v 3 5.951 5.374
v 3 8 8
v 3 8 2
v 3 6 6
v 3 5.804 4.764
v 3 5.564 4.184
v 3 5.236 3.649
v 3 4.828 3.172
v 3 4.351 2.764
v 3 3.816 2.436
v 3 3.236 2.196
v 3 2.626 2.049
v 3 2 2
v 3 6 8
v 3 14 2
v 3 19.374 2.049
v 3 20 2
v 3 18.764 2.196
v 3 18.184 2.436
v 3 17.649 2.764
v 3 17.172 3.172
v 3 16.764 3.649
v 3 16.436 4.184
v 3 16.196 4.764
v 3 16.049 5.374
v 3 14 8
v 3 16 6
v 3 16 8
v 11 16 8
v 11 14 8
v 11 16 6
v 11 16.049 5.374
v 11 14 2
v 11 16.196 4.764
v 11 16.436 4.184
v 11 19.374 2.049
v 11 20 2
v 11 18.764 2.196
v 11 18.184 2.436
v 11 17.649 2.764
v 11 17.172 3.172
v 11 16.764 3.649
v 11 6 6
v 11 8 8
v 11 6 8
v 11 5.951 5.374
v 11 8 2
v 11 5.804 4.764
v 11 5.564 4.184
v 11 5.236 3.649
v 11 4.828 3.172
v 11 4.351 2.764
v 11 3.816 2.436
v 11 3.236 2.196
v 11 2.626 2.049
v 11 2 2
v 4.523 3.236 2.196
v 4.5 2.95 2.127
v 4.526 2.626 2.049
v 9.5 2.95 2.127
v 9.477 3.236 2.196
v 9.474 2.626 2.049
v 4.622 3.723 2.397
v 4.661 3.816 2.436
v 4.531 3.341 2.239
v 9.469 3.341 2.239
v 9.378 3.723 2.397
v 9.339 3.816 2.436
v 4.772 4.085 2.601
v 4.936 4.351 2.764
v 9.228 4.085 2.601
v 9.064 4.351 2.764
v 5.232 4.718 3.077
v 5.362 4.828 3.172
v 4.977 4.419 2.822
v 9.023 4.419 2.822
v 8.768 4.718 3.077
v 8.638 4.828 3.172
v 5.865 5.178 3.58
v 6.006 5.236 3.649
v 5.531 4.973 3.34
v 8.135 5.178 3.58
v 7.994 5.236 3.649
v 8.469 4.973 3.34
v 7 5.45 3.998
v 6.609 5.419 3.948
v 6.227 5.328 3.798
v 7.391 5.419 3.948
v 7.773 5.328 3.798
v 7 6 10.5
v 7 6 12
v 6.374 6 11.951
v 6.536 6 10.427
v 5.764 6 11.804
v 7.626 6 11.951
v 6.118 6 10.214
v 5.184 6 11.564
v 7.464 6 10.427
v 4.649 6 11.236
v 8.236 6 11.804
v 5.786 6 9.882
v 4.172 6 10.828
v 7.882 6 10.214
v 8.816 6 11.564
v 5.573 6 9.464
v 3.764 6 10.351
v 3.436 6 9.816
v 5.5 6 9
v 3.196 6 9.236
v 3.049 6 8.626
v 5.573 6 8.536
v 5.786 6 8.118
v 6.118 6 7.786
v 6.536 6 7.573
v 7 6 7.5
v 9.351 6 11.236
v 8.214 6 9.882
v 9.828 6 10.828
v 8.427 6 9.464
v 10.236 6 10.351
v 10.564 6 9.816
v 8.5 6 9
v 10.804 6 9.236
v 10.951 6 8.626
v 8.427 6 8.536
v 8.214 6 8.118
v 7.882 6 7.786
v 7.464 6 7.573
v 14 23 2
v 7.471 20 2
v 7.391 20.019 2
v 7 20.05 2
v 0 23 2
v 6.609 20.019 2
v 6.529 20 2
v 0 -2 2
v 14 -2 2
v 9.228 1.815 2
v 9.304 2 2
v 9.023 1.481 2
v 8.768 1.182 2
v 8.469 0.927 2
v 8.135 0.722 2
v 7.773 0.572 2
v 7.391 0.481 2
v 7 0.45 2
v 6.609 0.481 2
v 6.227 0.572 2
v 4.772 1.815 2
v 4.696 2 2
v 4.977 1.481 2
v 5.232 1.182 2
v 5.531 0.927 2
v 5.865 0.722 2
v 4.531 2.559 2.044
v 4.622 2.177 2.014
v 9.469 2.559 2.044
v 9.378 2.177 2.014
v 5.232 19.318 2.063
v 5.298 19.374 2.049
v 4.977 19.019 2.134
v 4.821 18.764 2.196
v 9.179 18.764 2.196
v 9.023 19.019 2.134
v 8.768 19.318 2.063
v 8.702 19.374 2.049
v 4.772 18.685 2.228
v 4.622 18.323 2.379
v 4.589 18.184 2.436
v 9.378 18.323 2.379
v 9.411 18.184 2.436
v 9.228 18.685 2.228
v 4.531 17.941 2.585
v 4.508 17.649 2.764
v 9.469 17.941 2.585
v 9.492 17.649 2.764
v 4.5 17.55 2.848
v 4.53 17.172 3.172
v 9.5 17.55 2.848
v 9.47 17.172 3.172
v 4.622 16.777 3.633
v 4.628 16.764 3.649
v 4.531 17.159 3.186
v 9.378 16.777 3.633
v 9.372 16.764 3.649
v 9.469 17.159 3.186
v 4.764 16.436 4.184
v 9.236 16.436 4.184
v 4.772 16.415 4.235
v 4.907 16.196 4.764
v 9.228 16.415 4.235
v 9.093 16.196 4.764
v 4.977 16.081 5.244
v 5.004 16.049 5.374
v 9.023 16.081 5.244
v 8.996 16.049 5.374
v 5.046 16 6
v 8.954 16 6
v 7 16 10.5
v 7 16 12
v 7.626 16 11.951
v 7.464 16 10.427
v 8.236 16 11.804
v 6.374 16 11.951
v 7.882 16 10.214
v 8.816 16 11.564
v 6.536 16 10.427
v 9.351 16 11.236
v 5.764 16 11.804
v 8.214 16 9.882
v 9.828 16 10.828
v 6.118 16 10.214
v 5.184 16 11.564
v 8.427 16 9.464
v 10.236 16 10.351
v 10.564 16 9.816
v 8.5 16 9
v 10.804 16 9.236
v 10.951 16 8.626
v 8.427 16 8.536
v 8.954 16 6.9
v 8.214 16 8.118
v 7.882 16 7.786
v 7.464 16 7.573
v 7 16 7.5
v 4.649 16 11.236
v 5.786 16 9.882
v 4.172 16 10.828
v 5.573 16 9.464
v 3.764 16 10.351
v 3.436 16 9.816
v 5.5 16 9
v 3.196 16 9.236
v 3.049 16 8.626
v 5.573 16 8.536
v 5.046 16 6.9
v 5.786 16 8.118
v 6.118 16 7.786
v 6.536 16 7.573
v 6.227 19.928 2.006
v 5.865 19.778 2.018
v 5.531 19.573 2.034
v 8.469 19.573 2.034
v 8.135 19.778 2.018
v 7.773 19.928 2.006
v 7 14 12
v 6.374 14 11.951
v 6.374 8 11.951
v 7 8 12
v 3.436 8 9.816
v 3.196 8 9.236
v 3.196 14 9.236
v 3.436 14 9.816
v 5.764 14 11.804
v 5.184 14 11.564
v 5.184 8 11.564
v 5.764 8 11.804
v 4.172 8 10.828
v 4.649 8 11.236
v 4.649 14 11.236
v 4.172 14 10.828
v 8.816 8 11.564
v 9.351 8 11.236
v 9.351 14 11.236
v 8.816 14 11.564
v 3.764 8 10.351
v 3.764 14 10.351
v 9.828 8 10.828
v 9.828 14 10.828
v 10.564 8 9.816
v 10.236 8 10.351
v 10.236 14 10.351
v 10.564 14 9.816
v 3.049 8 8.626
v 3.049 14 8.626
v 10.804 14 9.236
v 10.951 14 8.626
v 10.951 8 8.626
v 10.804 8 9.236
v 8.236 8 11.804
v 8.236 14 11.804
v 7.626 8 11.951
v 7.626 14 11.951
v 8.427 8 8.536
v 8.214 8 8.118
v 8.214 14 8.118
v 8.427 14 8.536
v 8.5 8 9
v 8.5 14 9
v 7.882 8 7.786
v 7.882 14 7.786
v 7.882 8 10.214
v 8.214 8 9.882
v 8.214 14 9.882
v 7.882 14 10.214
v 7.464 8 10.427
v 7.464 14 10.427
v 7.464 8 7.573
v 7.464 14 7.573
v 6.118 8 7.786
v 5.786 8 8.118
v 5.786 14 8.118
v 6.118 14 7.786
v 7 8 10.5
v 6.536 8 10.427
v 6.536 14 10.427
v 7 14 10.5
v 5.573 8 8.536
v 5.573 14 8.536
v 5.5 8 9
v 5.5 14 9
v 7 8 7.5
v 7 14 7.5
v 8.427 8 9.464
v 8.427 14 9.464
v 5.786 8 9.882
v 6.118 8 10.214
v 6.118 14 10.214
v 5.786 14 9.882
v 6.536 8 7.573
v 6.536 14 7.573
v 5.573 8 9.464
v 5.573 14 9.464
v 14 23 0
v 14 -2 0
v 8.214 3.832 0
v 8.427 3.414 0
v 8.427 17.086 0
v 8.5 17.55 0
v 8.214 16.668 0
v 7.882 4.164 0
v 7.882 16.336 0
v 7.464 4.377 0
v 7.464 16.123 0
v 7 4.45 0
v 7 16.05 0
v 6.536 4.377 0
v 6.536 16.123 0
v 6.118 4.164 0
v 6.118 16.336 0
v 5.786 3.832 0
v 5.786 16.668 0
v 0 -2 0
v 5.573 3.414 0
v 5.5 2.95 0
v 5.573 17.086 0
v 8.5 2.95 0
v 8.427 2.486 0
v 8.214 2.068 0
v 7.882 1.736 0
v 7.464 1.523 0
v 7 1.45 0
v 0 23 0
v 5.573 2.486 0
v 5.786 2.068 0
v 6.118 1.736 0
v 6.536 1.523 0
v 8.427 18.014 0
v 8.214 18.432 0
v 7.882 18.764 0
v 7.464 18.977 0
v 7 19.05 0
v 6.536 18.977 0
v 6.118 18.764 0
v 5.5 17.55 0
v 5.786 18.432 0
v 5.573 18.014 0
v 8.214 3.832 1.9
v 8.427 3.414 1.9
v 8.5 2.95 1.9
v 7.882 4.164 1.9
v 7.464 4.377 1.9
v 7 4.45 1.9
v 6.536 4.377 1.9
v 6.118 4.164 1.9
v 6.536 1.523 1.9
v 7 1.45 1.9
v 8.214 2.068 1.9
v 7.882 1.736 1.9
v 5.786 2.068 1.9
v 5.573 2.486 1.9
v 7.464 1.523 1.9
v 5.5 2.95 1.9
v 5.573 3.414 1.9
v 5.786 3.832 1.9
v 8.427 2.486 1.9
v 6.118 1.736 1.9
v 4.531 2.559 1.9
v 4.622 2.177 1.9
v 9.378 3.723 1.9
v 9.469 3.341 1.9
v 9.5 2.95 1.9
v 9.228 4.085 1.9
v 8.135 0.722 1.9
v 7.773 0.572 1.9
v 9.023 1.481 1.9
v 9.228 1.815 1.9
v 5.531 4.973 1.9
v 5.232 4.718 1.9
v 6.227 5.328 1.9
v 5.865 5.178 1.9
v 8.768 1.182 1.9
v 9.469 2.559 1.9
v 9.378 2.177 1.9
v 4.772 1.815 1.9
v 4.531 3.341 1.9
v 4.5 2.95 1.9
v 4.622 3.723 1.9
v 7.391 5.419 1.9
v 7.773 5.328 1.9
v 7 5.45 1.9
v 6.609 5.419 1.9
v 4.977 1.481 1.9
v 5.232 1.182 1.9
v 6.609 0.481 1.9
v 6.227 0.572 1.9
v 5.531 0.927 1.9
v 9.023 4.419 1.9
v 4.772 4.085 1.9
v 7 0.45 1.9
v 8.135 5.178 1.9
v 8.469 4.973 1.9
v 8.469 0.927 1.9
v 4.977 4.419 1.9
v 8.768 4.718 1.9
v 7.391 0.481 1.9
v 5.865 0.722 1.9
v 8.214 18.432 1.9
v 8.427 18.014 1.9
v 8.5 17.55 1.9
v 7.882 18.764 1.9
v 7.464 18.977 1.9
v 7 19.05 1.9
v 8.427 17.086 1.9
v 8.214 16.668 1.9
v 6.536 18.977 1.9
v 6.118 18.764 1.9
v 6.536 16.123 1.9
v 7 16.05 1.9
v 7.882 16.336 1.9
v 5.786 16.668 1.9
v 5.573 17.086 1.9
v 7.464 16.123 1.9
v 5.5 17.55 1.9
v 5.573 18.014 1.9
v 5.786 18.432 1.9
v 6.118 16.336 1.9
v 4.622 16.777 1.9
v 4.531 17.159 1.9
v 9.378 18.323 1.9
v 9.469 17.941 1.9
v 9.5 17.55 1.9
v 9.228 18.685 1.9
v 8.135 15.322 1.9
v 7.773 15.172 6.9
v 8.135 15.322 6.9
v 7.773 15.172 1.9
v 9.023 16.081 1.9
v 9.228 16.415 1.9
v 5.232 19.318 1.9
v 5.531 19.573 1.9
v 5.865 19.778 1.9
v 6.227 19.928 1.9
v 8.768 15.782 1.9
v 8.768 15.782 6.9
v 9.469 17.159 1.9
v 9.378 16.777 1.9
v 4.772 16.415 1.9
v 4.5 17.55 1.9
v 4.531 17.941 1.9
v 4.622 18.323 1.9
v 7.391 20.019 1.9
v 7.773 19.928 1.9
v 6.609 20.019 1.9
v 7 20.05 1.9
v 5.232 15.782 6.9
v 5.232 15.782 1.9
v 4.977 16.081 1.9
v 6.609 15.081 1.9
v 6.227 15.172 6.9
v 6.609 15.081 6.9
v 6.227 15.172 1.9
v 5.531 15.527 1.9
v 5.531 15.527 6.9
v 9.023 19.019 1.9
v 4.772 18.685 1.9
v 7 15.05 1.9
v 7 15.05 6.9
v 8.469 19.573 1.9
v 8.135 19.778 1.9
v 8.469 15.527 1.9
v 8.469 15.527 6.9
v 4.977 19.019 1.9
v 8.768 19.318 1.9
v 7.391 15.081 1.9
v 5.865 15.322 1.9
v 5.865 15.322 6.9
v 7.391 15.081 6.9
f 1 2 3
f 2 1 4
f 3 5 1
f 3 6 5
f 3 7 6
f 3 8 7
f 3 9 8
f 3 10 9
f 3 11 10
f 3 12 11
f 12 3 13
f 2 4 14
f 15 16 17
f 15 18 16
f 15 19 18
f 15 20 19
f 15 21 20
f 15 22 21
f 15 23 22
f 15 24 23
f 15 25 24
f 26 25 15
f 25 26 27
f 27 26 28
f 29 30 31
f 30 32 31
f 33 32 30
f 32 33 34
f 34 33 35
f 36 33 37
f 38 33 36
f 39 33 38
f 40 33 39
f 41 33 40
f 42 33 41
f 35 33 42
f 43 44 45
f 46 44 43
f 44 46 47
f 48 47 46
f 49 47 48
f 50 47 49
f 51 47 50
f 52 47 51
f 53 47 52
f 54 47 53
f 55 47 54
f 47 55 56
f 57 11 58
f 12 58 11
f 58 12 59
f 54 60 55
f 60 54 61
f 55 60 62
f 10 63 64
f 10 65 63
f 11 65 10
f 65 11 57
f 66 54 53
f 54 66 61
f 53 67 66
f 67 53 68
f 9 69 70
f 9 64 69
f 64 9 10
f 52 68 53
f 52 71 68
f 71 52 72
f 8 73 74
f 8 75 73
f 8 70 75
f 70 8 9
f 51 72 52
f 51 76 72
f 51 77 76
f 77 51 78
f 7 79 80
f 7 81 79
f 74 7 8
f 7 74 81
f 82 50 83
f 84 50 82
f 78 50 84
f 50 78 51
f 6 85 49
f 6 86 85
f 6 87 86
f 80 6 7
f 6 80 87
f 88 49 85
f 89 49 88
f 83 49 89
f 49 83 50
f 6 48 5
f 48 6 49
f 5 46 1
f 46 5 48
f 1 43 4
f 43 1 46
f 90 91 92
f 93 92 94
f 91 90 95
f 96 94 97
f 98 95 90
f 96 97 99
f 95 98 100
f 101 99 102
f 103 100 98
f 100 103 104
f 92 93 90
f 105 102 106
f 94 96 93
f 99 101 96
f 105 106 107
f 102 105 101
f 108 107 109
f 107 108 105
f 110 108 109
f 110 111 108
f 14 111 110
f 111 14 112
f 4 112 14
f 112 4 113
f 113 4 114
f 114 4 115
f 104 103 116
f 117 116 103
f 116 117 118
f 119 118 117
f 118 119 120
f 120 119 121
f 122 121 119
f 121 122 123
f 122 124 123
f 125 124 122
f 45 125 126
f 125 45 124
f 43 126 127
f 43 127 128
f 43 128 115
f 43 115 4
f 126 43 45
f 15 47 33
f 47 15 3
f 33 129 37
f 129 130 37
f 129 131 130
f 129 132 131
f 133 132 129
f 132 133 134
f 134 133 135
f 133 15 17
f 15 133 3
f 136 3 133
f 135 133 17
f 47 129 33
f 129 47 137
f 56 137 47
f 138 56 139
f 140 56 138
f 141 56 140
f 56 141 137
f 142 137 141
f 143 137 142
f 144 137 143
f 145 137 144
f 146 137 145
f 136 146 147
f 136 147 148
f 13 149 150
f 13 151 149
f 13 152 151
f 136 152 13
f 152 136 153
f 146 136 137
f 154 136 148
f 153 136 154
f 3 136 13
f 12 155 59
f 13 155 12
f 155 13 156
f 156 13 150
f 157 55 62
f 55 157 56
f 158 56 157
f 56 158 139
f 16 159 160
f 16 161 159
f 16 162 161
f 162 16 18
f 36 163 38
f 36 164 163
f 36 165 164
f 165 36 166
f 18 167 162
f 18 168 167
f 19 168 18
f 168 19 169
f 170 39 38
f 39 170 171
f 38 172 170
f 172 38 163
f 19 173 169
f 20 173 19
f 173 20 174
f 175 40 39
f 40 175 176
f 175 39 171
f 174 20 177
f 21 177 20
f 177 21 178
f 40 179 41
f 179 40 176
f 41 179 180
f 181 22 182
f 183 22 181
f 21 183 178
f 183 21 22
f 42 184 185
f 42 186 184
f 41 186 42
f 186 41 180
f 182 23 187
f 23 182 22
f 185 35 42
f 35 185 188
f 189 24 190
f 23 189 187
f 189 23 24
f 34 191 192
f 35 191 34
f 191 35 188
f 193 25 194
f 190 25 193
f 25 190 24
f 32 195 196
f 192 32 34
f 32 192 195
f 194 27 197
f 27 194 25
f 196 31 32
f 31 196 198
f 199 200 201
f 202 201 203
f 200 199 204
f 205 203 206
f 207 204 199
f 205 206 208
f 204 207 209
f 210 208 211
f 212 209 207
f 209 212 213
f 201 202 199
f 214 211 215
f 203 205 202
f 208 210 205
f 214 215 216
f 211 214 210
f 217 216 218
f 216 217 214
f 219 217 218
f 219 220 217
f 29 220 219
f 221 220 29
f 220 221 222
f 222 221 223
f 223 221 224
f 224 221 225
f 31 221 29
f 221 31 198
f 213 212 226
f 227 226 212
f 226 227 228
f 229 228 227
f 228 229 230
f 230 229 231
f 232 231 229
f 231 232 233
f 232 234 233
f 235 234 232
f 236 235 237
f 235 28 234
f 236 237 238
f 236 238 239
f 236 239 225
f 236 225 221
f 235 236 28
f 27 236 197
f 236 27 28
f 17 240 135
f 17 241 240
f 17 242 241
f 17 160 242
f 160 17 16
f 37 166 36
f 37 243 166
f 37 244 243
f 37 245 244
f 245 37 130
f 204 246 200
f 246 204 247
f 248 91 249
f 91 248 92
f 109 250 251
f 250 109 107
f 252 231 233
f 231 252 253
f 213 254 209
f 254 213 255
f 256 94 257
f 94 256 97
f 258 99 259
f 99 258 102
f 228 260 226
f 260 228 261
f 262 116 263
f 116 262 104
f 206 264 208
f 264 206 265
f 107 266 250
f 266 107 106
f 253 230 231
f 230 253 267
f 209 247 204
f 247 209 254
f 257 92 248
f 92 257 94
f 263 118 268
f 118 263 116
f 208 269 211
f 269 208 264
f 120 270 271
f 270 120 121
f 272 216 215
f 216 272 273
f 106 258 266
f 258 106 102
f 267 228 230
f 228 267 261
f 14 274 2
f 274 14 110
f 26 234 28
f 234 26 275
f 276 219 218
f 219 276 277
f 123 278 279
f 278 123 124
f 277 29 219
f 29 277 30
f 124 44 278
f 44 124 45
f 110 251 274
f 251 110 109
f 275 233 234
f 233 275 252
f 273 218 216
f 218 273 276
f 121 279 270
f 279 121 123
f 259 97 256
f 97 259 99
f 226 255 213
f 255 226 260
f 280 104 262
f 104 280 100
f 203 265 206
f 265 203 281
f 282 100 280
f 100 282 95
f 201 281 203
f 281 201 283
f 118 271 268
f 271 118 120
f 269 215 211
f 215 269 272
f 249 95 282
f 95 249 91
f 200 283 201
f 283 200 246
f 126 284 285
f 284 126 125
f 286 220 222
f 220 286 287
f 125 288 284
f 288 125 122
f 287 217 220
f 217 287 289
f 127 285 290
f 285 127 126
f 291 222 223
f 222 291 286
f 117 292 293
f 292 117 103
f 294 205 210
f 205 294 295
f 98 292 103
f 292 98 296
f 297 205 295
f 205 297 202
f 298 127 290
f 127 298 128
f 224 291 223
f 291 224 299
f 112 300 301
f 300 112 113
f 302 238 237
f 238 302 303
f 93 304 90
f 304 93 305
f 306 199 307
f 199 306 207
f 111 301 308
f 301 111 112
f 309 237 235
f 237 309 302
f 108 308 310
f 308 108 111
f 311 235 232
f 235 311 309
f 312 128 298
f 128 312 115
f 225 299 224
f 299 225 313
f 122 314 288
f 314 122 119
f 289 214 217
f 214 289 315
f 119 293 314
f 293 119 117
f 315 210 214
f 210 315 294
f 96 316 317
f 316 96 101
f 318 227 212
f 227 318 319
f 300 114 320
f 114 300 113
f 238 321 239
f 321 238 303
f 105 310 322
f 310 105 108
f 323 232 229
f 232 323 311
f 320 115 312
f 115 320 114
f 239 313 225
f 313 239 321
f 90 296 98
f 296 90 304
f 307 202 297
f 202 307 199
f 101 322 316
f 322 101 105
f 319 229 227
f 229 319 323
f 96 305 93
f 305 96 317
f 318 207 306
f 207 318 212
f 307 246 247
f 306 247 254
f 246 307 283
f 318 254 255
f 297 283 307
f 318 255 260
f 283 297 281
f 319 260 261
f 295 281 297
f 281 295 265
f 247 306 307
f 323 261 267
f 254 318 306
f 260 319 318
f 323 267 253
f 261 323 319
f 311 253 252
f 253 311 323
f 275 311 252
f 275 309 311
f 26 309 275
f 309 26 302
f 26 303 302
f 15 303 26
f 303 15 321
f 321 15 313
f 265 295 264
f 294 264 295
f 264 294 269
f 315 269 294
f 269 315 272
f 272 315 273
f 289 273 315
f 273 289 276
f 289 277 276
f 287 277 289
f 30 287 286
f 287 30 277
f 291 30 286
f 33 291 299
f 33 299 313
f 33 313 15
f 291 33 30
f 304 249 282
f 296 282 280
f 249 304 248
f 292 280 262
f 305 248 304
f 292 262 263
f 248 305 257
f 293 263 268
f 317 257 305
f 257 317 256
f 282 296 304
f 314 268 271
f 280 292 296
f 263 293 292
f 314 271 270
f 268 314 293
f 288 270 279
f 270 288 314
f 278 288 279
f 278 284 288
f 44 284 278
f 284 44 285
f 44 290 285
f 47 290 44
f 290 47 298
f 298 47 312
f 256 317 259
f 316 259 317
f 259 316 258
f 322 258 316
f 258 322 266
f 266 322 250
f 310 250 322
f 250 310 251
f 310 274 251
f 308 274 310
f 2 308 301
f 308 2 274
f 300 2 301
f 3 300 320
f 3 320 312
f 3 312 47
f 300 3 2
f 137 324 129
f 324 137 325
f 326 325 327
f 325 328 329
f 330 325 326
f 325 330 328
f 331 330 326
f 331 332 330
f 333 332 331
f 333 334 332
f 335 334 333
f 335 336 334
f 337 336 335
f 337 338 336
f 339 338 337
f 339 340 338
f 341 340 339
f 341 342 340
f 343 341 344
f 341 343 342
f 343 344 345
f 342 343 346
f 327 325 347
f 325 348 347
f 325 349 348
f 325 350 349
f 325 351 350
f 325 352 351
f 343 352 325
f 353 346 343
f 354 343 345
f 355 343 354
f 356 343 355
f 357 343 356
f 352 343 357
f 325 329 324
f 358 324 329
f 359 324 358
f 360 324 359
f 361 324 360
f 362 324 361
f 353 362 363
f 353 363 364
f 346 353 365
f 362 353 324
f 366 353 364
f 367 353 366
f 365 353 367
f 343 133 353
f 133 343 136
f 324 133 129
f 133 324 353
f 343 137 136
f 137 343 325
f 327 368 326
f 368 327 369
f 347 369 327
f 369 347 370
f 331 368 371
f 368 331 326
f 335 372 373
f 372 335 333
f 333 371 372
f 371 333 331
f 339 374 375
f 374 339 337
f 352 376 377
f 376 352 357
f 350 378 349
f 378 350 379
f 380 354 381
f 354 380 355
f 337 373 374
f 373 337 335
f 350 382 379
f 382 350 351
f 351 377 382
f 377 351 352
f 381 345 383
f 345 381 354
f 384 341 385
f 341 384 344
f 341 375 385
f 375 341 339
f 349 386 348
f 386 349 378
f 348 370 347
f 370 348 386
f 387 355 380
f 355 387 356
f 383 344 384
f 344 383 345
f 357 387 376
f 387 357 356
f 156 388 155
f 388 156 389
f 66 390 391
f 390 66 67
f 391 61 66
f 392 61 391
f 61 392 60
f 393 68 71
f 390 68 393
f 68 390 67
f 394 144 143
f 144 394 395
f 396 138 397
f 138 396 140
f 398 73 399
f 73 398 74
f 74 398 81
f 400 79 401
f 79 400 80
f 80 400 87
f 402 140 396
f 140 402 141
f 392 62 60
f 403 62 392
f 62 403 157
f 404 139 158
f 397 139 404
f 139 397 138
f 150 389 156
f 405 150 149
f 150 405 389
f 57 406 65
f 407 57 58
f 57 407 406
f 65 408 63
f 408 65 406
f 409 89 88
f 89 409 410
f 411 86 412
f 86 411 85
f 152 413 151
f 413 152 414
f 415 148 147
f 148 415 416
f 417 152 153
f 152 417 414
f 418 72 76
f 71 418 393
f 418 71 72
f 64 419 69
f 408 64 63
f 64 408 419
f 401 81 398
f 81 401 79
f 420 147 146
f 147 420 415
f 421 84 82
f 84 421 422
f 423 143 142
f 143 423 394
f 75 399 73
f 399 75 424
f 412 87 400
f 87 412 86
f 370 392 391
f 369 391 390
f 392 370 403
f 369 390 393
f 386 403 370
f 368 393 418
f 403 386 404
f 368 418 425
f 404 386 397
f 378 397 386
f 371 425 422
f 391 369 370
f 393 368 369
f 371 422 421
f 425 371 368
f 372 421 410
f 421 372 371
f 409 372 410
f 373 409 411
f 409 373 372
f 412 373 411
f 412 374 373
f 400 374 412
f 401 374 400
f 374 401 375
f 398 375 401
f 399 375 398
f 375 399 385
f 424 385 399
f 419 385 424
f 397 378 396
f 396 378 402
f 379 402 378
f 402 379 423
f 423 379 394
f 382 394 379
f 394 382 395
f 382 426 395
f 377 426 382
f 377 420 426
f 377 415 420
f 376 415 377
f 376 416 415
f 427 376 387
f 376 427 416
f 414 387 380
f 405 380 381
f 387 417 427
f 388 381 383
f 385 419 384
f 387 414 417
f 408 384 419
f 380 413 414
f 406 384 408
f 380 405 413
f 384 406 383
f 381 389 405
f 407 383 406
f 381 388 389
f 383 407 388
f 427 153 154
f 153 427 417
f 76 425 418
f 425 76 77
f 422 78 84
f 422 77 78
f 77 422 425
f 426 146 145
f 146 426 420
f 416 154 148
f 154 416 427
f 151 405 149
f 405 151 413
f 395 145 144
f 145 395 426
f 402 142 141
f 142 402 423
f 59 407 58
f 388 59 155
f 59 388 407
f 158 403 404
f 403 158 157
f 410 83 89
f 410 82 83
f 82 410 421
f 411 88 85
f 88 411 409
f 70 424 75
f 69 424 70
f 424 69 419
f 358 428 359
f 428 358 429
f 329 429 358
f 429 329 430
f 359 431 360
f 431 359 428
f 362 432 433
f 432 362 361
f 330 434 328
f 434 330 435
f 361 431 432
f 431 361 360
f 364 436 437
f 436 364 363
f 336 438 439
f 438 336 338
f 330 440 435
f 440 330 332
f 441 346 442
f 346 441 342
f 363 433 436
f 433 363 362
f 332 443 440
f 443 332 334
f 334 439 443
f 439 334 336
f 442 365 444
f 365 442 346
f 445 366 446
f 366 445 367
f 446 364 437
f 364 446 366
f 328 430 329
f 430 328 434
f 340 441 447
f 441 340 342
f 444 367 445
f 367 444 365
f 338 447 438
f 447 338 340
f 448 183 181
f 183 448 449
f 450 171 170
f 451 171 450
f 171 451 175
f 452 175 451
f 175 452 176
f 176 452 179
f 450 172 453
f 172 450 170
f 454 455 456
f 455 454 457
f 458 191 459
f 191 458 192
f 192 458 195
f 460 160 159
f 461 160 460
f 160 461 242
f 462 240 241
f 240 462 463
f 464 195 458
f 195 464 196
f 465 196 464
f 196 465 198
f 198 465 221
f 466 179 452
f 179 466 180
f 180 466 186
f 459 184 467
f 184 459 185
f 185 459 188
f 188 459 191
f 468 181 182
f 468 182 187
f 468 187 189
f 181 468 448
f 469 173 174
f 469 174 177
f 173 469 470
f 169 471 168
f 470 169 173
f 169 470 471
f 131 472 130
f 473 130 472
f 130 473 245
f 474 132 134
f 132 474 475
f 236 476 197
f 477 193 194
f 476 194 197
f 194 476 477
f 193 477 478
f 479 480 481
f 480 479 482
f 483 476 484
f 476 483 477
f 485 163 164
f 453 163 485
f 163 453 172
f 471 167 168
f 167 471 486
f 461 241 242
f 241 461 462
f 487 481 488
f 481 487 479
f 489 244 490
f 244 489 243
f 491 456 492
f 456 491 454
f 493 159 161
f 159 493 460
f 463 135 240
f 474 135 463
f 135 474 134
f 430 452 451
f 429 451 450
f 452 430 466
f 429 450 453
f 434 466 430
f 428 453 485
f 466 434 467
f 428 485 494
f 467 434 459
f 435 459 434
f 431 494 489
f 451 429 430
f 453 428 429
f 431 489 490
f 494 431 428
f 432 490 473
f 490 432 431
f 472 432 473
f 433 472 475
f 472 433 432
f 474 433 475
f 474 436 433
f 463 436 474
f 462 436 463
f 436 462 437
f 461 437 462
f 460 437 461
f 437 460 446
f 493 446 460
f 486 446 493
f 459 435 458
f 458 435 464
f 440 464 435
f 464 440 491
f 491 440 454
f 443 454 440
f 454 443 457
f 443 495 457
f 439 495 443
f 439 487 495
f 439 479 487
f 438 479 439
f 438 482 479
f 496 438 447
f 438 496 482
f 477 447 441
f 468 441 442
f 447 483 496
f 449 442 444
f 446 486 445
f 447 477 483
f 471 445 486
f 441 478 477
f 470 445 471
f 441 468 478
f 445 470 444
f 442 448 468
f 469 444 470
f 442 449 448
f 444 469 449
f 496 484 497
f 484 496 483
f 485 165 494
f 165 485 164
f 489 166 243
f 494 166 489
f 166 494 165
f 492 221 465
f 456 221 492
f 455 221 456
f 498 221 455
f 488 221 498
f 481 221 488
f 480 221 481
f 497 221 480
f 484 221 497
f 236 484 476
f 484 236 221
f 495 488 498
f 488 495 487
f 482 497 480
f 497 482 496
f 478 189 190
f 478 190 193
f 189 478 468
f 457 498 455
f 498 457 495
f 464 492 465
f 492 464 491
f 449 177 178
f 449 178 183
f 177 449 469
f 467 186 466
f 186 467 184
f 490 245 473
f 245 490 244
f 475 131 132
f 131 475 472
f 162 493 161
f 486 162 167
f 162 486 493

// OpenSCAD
difference() {
  union() {
    translate([0,-2]) cube([14,25,2]);
translate([0,1,2]) plate_bracket();
  }
  for(y=[0,14.6])
    translate([7,2.95+y,-.1]) {
      cylinder(d=3,h=14,$fn=20);
      translate([0,0,2]) cylinder(d=5,h=5,$fn=40);
    }
}
module plate_bracket() {
  difference() {
    union(){
      translate([3,15,0]) rotate([90,0]) linear_extrude(10, convexity=3) {
        square([8,6]);
        translate([4,6]) circle(d=8,$fn=40);
      }
      translate([0,10]) for(m=[0,1]) mirror([0,m]) translate([0,-10])
      translate([3,5]) mirror([0,0,1]) rotate([90,180,90]) linear_extrude(8,convexity=4) {
        difference(){
          square([4,4]);
          translate([4,4]) circle(r=4,$fn=40);
        }
      }
    }
    translate([7,0,7]) rotate([-90,0]) cylinder(d=3,h=20,$fn=20);
    translate([0,7,-.01]) cube([20,6,20]);
  }
}
